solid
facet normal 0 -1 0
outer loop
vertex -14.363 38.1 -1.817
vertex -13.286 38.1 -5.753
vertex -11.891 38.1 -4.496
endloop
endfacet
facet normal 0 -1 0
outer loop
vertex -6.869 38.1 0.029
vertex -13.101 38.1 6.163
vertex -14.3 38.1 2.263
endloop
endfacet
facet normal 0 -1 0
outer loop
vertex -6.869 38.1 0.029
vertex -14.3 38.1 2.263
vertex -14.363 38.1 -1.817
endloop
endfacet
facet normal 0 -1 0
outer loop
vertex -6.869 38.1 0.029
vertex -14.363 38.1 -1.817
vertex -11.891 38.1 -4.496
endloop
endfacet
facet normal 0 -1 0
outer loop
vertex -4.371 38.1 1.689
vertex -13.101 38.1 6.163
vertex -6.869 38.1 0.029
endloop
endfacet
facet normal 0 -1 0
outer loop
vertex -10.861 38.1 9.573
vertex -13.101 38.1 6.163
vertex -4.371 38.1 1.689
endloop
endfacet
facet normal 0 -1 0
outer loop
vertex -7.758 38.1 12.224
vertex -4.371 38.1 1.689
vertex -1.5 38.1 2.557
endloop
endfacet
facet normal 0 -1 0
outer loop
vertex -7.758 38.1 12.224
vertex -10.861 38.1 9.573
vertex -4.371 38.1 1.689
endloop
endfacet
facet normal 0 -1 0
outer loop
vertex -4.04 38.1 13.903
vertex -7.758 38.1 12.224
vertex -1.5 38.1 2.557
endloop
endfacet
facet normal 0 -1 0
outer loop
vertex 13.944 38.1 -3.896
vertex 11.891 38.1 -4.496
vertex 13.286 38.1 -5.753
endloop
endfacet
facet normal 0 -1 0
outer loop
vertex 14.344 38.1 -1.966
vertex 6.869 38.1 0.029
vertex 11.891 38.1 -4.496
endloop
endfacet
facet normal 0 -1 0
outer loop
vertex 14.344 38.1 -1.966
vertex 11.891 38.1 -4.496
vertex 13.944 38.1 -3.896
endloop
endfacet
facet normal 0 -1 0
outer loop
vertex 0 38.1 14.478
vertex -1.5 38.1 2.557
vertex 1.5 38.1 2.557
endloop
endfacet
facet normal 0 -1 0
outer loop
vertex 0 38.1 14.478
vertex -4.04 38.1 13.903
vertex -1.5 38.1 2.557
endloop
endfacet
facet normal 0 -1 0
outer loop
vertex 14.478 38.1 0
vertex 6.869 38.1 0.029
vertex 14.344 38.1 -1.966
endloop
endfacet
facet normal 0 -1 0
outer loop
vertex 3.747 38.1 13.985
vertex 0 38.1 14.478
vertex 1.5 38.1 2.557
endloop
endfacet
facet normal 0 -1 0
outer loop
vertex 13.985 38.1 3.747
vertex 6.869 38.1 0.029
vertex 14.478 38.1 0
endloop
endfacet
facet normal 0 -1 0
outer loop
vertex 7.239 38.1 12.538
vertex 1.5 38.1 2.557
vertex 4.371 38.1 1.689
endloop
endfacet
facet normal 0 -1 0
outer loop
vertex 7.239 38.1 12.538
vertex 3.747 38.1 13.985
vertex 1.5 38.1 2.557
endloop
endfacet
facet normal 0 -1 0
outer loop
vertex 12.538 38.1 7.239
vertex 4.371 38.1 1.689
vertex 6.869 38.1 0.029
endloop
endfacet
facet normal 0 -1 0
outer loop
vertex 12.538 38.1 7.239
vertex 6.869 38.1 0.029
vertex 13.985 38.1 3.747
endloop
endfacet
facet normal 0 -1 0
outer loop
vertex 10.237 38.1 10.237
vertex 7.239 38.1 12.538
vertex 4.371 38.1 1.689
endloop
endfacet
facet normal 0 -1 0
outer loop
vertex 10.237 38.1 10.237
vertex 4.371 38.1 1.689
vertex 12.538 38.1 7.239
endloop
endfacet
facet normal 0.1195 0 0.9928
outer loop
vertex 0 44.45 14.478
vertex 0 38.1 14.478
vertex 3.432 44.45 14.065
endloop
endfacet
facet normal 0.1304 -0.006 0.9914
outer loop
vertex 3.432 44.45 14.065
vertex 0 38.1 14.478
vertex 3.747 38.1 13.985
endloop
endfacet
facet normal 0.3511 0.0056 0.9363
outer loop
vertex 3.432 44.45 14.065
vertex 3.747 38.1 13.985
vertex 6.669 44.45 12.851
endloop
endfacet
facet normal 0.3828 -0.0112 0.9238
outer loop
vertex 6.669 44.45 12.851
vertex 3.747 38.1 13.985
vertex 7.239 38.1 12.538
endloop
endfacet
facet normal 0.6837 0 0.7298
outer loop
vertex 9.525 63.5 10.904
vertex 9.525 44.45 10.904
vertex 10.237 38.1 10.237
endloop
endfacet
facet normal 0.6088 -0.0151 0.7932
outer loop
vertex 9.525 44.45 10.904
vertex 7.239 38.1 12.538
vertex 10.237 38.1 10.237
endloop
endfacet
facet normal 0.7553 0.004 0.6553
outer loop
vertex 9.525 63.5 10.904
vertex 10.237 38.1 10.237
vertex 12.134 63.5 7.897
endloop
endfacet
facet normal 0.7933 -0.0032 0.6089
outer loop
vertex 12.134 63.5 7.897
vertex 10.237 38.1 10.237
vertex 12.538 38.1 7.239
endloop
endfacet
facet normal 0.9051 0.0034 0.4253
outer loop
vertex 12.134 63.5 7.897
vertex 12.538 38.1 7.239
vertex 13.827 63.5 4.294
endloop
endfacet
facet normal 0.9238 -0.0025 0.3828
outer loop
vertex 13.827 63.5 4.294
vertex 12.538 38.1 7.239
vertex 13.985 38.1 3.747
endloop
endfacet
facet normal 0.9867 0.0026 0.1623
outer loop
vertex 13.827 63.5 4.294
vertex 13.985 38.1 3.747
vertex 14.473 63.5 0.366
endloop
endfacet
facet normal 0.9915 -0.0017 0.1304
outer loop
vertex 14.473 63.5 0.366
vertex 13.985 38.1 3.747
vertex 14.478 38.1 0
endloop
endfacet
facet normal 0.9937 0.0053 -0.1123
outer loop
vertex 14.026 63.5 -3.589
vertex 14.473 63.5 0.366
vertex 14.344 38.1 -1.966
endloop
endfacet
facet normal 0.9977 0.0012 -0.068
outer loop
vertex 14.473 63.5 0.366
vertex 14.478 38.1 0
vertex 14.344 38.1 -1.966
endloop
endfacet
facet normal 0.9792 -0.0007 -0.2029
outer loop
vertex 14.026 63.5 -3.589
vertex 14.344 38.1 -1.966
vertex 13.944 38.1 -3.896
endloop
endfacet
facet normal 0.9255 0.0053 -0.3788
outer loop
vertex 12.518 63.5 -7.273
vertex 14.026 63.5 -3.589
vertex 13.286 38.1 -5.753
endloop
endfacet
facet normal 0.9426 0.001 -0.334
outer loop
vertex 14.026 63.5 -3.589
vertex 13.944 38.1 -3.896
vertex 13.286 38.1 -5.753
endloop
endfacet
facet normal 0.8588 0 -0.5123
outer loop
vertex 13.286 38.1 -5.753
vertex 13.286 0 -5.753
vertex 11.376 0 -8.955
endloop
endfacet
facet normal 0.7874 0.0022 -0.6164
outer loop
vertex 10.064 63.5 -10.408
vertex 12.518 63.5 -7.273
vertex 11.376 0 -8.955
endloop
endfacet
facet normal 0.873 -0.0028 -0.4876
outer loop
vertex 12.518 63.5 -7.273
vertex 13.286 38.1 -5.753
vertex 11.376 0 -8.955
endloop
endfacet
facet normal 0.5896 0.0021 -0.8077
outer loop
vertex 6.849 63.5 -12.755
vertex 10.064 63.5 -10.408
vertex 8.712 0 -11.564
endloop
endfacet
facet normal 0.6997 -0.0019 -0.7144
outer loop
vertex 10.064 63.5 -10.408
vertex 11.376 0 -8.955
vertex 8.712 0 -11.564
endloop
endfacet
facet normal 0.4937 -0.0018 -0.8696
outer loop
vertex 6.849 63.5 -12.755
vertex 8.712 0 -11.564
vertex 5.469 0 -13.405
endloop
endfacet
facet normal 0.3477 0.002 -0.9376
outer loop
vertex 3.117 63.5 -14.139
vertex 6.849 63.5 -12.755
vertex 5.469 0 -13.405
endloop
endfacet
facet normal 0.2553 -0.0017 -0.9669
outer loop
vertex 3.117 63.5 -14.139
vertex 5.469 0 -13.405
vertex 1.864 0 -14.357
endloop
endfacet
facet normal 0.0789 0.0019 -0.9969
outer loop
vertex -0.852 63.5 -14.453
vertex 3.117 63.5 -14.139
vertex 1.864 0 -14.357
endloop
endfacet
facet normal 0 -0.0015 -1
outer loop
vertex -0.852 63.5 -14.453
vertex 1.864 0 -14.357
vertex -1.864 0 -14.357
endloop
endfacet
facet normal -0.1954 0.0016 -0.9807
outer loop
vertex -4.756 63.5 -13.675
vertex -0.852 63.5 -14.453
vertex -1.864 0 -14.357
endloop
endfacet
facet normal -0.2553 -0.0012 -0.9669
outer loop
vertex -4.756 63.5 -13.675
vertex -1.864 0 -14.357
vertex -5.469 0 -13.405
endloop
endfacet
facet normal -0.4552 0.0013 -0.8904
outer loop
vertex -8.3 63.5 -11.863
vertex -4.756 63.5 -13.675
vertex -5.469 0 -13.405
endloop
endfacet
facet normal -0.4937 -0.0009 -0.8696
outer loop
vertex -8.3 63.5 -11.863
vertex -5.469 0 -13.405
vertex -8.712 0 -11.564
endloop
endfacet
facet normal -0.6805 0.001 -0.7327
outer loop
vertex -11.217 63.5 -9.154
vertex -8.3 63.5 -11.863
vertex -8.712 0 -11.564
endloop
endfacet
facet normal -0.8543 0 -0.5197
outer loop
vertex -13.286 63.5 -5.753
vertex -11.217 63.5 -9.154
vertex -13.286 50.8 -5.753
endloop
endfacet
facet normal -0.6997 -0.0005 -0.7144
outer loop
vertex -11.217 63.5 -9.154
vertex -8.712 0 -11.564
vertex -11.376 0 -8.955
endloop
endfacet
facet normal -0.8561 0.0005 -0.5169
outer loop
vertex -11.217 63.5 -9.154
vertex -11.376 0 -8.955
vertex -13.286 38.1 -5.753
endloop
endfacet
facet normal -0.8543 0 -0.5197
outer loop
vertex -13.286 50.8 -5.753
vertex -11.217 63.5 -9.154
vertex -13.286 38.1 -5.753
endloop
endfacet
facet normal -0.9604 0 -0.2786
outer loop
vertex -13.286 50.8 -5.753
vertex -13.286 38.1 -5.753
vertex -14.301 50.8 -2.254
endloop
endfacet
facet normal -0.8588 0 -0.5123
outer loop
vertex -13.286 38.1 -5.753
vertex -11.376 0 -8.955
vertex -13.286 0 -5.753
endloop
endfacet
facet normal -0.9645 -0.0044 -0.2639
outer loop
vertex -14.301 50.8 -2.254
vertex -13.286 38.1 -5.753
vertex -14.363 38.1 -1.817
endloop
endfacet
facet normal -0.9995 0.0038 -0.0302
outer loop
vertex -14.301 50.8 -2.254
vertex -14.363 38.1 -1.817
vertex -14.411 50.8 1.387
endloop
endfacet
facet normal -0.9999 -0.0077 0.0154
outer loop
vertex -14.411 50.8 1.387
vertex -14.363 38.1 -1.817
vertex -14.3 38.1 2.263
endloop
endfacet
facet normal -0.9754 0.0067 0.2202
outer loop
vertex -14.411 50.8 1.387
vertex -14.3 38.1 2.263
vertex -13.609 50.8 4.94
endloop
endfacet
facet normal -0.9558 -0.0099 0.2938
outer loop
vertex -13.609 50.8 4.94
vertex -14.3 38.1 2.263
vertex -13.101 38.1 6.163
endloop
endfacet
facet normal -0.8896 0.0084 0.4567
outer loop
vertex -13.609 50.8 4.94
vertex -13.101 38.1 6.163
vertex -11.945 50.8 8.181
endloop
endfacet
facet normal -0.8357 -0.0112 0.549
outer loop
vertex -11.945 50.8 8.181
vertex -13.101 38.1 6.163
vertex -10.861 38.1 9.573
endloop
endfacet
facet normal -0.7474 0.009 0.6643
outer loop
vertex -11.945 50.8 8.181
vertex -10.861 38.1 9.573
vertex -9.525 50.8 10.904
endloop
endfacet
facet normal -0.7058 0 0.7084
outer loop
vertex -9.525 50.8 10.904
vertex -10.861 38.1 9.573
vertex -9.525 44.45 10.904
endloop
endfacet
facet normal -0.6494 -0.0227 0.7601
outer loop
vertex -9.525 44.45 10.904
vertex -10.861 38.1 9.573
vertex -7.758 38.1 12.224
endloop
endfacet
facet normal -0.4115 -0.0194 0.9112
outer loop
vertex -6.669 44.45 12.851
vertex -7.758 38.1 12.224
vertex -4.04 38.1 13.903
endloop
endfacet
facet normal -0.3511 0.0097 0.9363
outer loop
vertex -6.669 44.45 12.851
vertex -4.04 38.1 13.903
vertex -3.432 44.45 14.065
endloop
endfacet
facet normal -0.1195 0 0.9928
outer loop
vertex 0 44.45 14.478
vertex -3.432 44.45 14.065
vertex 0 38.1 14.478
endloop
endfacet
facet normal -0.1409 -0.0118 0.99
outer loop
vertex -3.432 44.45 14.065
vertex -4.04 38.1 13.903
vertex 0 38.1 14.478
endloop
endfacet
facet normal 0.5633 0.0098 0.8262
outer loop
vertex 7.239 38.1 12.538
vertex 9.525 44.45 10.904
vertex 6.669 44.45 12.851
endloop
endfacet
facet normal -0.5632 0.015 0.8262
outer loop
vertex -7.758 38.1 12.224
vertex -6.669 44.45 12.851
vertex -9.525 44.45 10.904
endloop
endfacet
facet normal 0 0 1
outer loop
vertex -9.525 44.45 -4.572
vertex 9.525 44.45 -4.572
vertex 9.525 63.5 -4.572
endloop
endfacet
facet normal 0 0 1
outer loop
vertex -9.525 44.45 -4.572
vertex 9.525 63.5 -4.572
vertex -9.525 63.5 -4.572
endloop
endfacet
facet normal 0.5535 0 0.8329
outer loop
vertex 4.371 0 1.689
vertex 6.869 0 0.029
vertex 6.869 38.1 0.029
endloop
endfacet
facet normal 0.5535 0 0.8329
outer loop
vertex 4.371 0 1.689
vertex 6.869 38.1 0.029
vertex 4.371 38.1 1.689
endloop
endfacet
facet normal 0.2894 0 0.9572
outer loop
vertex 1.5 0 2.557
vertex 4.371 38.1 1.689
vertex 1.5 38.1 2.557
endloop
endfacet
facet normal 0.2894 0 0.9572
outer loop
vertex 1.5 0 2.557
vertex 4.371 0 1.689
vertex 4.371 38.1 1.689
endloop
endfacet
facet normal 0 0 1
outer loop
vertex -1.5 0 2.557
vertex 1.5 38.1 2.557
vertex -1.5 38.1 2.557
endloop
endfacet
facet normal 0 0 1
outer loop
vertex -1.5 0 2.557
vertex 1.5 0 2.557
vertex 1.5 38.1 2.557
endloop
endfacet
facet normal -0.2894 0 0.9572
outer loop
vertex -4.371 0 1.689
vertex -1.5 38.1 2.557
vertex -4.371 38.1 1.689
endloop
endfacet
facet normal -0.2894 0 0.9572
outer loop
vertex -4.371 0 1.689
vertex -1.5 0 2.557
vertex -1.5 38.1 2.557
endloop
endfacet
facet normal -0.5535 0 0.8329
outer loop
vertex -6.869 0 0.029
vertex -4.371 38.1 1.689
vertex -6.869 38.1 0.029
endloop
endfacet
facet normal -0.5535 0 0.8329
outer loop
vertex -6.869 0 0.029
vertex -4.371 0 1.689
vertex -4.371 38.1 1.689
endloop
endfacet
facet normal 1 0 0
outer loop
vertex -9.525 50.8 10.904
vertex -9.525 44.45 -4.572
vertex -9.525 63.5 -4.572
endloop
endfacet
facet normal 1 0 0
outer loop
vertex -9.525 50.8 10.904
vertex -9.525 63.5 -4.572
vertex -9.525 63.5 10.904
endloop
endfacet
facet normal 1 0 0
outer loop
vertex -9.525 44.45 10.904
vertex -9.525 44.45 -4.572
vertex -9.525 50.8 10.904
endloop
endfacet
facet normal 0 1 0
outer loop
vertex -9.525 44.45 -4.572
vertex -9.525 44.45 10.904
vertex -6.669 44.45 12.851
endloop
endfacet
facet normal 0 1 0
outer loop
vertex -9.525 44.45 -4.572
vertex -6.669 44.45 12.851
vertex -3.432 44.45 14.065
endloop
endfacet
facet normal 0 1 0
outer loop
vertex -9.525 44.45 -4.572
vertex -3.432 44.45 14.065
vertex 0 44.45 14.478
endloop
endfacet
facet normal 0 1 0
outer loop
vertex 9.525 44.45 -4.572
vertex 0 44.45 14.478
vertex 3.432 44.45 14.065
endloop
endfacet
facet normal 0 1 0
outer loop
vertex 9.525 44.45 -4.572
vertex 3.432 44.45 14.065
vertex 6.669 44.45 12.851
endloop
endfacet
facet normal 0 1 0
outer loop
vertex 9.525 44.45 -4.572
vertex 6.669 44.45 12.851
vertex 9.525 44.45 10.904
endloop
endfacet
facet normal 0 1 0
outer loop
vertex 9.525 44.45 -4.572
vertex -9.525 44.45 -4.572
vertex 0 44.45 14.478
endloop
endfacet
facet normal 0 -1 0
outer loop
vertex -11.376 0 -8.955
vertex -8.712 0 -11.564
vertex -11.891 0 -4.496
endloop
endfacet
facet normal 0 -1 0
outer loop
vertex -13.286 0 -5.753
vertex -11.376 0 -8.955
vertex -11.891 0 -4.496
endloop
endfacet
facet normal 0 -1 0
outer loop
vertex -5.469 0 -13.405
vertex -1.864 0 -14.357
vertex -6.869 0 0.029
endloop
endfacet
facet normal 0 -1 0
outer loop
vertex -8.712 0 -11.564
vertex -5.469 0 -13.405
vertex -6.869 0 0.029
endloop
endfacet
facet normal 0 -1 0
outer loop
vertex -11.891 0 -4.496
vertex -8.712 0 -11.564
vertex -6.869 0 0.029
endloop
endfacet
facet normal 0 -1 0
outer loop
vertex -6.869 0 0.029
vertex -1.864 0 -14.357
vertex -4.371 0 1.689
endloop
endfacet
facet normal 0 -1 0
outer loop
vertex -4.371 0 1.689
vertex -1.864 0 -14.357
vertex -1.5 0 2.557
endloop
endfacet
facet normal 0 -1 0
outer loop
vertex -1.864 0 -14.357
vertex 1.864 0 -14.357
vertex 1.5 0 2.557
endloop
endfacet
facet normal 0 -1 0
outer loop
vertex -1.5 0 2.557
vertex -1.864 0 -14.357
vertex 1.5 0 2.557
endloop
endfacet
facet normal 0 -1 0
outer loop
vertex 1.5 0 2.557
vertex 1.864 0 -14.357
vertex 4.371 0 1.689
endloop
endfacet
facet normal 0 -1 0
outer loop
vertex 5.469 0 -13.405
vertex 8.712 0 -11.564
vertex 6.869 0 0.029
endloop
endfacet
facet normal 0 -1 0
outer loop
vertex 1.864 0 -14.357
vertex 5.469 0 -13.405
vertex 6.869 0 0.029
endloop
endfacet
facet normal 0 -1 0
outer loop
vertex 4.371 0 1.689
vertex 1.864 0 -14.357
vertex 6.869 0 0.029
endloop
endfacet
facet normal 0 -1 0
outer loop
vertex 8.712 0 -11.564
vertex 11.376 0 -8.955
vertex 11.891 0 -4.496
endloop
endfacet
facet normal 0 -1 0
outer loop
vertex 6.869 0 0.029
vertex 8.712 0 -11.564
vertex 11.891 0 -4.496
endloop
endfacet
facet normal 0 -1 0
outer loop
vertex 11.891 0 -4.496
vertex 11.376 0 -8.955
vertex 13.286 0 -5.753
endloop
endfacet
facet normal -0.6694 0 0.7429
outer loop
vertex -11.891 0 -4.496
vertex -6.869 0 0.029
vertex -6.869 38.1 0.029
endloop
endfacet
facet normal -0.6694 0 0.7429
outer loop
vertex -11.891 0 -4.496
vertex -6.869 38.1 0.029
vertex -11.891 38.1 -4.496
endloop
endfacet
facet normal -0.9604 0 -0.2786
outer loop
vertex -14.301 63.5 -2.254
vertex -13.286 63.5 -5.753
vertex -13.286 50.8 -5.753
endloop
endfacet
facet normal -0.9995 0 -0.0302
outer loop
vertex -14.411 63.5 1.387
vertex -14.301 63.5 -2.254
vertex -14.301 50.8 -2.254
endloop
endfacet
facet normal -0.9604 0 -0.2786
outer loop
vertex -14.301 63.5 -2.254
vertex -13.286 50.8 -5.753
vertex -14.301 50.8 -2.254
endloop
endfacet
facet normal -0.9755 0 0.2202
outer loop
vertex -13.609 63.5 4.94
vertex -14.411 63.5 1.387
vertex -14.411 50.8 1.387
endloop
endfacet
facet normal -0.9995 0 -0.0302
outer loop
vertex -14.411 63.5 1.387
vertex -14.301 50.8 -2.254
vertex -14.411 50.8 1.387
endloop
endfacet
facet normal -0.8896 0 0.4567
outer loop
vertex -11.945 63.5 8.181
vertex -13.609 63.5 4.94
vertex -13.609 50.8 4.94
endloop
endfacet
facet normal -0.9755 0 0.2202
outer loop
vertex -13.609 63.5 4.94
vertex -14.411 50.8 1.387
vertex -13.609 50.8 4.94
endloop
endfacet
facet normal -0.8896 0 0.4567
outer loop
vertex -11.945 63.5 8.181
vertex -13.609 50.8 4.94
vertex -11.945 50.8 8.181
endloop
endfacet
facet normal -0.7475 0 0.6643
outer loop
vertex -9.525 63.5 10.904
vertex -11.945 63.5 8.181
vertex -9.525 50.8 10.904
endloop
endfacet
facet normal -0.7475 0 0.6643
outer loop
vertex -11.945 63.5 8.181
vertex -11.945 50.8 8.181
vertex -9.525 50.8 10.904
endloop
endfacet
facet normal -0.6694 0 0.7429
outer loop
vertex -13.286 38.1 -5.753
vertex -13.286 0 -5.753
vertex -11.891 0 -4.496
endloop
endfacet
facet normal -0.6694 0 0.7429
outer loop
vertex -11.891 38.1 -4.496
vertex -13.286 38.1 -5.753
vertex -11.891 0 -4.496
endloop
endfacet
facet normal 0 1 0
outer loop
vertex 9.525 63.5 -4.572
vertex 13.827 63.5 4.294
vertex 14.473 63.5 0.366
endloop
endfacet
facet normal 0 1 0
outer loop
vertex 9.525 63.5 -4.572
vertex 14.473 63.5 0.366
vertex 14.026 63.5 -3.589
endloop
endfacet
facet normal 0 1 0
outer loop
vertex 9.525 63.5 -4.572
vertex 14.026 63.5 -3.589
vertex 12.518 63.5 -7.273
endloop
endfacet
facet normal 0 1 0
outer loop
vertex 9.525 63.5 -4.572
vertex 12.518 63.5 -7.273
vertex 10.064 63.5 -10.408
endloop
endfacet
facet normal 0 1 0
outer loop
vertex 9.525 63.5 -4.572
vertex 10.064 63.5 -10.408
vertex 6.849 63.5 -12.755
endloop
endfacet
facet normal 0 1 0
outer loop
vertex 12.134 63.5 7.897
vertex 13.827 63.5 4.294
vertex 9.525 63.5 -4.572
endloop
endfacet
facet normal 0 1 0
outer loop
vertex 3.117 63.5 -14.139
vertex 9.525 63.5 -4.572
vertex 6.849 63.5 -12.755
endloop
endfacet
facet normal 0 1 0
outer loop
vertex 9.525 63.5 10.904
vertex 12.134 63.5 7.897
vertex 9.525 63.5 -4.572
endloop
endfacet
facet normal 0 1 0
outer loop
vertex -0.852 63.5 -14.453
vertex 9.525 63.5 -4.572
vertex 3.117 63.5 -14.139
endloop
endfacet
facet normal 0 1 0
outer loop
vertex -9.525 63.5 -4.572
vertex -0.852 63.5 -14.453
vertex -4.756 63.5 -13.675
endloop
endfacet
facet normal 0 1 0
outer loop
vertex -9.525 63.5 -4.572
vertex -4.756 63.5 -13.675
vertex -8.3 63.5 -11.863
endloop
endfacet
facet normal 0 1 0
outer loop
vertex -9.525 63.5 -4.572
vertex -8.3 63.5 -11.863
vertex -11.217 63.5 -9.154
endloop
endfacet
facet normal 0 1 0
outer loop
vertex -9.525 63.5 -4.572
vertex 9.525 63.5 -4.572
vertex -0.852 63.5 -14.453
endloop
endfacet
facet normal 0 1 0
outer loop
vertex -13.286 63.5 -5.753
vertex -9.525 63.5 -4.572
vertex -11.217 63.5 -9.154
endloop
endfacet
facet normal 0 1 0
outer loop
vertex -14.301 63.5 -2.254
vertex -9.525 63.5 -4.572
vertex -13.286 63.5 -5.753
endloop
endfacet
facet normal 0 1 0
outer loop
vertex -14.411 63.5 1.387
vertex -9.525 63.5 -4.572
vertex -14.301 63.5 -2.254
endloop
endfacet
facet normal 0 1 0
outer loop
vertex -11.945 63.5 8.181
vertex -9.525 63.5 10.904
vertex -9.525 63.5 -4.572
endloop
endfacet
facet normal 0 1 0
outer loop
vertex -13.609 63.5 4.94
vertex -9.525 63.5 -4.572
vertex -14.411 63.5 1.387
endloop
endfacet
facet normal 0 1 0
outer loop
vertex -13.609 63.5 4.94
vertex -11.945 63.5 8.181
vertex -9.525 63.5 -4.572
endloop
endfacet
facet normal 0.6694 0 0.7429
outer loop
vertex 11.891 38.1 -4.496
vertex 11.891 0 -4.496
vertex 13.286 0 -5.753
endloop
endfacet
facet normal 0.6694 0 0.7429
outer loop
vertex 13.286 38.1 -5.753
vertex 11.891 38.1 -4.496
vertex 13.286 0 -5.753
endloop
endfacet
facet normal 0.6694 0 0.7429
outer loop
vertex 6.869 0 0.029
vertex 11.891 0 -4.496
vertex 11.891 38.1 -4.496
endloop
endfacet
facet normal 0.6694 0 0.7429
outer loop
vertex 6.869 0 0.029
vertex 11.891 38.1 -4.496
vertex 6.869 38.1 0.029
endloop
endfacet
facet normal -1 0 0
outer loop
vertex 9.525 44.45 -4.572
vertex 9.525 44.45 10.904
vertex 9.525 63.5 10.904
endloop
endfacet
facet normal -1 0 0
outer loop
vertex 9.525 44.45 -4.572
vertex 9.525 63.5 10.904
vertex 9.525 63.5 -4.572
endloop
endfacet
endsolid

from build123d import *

# Parameters (mm, degrees)
SKETCH2_R                = 14.478
BOSS_EXTRUDE1_DEPTH      = 50.8
CUT_EXTRUDE3_DEPTH       = 38.1
BOSS_EXTRUDE2_DEPTH      = 12.7
BOSS_EXTRUDE2_DEPTH_BACK = 12.7
SKETCH16_R               = 14.478
SKETCH17_W               = 19.05
SKETCH17_H               = 19.05
CUT_EXTRUDE4_DEPTH       = 19.05


with BuildPart() as part:
    # Sketch2 → Boss-Extrude1 (new body)
    with BuildSketch(Plane(origin=(0, 0, 0), x_dir=(1, 0, 0), z_dir=(0, 1, 0))):
        Circle(SKETCH2_R)
        with BuildLine():
            Line((-13.081, 3.175), (-8.059107313, -1.349826056))
            ThreePointArc((-8.059107313, -1.349826056), (0, -4.445), (8.059107313, -1.349826056))
            Line((8.059107313, -1.349826056), (13.081, 3.175))
            ThreePointArc((13.081, 3.175), (13.146371637, 4.430535164), (11.890836473, 4.495906802))
            Line((11.890836473, 4.495906802), (6.868943786, -0.028919255))
            ThreePointArc((6.868943786, -0.028919255), (0, -2.667), (-6.868943786, -0.028919255))
            Line((-6.868943786, -0.028919255), (-11.890836473, 4.495906802))
            ThreePointArc((-11.890836473, 4.495906802), (-13.146371637, 4.430535164), (-13.081, 3.175))
        make_face(mode=Mode.SUBTRACT)
    extrude(amount=BOSS_EXTRUDE1_DEPTH)

    # Sketch15 → Cut-Extrude3 (cut)
    with BuildSketch(Plane.XZ):
        with BuildLine():
            ThreePointArc((13.081, -3.175), (13.146371637, -4.430535164), (11.890836473, -4.495906802))
            Line((11.890836473, -4.495906802), (13.285944291, -5.752926933))
            ThreePointArc((13.285944291, -5.752926933), (14.176854119, -2.937565536), (14.478, 0))
            ThreePointArc((14.478, 0), (-2.937565536, 14.176854119), (-13.285944291, -5.752926933))
            Line((-13.285944291, -5.752926933), (-11.890836473, -4.495906802))
            ThreePointArc((-11.890836473, -4.495906802), (-13.146371637, -4.430535164), (-13.081, -3.175))
            Line((-13.081, -3.175), (-8.059107313, 1.349826056))
            ThreePointArc((-8.059107313, 1.349826056), (0, 4.445), (8.059107313, 1.349826056))
            Line((8.059107313, 1.349826056), (13.081, -3.175))
        make_face()
    extrude(amount=-CUT_EXTRUDE3_DEPTH, mode=Mode.SUBTRACT)

    # Sketch16 → Boss-Extrude2 (add, two sides: drawn at the far end of the back side and taken through both)
    with BuildSketch(Plane(origin=(0, 50.8, 0), x_dir=(1, 0, 0), z_dir=(0, 1, 0)).offset(-BOSS_EXTRUDE2_DEPTH_BACK)):
        Circle(SKETCH16_R)
    extrude(amount=BOSS_EXTRUDE2_DEPTH + BOSS_EXTRUDE2_DEPTH_BACK)

    # Sketch17 → Cut-Extrude4 (cut)
    with BuildSketch(Plane(origin=(0, 63.5, 0), x_dir=(1, 0, 0), z_dir=(0, 1, 0))):
        with Locations((0, -4.953)):
            Rectangle(SKETCH17_W, SKETCH17_H)
    extrude(amount=-CUT_EXTRUDE4_DEPTH, mode=Mode.SUBTRACT)


solid = part.part
